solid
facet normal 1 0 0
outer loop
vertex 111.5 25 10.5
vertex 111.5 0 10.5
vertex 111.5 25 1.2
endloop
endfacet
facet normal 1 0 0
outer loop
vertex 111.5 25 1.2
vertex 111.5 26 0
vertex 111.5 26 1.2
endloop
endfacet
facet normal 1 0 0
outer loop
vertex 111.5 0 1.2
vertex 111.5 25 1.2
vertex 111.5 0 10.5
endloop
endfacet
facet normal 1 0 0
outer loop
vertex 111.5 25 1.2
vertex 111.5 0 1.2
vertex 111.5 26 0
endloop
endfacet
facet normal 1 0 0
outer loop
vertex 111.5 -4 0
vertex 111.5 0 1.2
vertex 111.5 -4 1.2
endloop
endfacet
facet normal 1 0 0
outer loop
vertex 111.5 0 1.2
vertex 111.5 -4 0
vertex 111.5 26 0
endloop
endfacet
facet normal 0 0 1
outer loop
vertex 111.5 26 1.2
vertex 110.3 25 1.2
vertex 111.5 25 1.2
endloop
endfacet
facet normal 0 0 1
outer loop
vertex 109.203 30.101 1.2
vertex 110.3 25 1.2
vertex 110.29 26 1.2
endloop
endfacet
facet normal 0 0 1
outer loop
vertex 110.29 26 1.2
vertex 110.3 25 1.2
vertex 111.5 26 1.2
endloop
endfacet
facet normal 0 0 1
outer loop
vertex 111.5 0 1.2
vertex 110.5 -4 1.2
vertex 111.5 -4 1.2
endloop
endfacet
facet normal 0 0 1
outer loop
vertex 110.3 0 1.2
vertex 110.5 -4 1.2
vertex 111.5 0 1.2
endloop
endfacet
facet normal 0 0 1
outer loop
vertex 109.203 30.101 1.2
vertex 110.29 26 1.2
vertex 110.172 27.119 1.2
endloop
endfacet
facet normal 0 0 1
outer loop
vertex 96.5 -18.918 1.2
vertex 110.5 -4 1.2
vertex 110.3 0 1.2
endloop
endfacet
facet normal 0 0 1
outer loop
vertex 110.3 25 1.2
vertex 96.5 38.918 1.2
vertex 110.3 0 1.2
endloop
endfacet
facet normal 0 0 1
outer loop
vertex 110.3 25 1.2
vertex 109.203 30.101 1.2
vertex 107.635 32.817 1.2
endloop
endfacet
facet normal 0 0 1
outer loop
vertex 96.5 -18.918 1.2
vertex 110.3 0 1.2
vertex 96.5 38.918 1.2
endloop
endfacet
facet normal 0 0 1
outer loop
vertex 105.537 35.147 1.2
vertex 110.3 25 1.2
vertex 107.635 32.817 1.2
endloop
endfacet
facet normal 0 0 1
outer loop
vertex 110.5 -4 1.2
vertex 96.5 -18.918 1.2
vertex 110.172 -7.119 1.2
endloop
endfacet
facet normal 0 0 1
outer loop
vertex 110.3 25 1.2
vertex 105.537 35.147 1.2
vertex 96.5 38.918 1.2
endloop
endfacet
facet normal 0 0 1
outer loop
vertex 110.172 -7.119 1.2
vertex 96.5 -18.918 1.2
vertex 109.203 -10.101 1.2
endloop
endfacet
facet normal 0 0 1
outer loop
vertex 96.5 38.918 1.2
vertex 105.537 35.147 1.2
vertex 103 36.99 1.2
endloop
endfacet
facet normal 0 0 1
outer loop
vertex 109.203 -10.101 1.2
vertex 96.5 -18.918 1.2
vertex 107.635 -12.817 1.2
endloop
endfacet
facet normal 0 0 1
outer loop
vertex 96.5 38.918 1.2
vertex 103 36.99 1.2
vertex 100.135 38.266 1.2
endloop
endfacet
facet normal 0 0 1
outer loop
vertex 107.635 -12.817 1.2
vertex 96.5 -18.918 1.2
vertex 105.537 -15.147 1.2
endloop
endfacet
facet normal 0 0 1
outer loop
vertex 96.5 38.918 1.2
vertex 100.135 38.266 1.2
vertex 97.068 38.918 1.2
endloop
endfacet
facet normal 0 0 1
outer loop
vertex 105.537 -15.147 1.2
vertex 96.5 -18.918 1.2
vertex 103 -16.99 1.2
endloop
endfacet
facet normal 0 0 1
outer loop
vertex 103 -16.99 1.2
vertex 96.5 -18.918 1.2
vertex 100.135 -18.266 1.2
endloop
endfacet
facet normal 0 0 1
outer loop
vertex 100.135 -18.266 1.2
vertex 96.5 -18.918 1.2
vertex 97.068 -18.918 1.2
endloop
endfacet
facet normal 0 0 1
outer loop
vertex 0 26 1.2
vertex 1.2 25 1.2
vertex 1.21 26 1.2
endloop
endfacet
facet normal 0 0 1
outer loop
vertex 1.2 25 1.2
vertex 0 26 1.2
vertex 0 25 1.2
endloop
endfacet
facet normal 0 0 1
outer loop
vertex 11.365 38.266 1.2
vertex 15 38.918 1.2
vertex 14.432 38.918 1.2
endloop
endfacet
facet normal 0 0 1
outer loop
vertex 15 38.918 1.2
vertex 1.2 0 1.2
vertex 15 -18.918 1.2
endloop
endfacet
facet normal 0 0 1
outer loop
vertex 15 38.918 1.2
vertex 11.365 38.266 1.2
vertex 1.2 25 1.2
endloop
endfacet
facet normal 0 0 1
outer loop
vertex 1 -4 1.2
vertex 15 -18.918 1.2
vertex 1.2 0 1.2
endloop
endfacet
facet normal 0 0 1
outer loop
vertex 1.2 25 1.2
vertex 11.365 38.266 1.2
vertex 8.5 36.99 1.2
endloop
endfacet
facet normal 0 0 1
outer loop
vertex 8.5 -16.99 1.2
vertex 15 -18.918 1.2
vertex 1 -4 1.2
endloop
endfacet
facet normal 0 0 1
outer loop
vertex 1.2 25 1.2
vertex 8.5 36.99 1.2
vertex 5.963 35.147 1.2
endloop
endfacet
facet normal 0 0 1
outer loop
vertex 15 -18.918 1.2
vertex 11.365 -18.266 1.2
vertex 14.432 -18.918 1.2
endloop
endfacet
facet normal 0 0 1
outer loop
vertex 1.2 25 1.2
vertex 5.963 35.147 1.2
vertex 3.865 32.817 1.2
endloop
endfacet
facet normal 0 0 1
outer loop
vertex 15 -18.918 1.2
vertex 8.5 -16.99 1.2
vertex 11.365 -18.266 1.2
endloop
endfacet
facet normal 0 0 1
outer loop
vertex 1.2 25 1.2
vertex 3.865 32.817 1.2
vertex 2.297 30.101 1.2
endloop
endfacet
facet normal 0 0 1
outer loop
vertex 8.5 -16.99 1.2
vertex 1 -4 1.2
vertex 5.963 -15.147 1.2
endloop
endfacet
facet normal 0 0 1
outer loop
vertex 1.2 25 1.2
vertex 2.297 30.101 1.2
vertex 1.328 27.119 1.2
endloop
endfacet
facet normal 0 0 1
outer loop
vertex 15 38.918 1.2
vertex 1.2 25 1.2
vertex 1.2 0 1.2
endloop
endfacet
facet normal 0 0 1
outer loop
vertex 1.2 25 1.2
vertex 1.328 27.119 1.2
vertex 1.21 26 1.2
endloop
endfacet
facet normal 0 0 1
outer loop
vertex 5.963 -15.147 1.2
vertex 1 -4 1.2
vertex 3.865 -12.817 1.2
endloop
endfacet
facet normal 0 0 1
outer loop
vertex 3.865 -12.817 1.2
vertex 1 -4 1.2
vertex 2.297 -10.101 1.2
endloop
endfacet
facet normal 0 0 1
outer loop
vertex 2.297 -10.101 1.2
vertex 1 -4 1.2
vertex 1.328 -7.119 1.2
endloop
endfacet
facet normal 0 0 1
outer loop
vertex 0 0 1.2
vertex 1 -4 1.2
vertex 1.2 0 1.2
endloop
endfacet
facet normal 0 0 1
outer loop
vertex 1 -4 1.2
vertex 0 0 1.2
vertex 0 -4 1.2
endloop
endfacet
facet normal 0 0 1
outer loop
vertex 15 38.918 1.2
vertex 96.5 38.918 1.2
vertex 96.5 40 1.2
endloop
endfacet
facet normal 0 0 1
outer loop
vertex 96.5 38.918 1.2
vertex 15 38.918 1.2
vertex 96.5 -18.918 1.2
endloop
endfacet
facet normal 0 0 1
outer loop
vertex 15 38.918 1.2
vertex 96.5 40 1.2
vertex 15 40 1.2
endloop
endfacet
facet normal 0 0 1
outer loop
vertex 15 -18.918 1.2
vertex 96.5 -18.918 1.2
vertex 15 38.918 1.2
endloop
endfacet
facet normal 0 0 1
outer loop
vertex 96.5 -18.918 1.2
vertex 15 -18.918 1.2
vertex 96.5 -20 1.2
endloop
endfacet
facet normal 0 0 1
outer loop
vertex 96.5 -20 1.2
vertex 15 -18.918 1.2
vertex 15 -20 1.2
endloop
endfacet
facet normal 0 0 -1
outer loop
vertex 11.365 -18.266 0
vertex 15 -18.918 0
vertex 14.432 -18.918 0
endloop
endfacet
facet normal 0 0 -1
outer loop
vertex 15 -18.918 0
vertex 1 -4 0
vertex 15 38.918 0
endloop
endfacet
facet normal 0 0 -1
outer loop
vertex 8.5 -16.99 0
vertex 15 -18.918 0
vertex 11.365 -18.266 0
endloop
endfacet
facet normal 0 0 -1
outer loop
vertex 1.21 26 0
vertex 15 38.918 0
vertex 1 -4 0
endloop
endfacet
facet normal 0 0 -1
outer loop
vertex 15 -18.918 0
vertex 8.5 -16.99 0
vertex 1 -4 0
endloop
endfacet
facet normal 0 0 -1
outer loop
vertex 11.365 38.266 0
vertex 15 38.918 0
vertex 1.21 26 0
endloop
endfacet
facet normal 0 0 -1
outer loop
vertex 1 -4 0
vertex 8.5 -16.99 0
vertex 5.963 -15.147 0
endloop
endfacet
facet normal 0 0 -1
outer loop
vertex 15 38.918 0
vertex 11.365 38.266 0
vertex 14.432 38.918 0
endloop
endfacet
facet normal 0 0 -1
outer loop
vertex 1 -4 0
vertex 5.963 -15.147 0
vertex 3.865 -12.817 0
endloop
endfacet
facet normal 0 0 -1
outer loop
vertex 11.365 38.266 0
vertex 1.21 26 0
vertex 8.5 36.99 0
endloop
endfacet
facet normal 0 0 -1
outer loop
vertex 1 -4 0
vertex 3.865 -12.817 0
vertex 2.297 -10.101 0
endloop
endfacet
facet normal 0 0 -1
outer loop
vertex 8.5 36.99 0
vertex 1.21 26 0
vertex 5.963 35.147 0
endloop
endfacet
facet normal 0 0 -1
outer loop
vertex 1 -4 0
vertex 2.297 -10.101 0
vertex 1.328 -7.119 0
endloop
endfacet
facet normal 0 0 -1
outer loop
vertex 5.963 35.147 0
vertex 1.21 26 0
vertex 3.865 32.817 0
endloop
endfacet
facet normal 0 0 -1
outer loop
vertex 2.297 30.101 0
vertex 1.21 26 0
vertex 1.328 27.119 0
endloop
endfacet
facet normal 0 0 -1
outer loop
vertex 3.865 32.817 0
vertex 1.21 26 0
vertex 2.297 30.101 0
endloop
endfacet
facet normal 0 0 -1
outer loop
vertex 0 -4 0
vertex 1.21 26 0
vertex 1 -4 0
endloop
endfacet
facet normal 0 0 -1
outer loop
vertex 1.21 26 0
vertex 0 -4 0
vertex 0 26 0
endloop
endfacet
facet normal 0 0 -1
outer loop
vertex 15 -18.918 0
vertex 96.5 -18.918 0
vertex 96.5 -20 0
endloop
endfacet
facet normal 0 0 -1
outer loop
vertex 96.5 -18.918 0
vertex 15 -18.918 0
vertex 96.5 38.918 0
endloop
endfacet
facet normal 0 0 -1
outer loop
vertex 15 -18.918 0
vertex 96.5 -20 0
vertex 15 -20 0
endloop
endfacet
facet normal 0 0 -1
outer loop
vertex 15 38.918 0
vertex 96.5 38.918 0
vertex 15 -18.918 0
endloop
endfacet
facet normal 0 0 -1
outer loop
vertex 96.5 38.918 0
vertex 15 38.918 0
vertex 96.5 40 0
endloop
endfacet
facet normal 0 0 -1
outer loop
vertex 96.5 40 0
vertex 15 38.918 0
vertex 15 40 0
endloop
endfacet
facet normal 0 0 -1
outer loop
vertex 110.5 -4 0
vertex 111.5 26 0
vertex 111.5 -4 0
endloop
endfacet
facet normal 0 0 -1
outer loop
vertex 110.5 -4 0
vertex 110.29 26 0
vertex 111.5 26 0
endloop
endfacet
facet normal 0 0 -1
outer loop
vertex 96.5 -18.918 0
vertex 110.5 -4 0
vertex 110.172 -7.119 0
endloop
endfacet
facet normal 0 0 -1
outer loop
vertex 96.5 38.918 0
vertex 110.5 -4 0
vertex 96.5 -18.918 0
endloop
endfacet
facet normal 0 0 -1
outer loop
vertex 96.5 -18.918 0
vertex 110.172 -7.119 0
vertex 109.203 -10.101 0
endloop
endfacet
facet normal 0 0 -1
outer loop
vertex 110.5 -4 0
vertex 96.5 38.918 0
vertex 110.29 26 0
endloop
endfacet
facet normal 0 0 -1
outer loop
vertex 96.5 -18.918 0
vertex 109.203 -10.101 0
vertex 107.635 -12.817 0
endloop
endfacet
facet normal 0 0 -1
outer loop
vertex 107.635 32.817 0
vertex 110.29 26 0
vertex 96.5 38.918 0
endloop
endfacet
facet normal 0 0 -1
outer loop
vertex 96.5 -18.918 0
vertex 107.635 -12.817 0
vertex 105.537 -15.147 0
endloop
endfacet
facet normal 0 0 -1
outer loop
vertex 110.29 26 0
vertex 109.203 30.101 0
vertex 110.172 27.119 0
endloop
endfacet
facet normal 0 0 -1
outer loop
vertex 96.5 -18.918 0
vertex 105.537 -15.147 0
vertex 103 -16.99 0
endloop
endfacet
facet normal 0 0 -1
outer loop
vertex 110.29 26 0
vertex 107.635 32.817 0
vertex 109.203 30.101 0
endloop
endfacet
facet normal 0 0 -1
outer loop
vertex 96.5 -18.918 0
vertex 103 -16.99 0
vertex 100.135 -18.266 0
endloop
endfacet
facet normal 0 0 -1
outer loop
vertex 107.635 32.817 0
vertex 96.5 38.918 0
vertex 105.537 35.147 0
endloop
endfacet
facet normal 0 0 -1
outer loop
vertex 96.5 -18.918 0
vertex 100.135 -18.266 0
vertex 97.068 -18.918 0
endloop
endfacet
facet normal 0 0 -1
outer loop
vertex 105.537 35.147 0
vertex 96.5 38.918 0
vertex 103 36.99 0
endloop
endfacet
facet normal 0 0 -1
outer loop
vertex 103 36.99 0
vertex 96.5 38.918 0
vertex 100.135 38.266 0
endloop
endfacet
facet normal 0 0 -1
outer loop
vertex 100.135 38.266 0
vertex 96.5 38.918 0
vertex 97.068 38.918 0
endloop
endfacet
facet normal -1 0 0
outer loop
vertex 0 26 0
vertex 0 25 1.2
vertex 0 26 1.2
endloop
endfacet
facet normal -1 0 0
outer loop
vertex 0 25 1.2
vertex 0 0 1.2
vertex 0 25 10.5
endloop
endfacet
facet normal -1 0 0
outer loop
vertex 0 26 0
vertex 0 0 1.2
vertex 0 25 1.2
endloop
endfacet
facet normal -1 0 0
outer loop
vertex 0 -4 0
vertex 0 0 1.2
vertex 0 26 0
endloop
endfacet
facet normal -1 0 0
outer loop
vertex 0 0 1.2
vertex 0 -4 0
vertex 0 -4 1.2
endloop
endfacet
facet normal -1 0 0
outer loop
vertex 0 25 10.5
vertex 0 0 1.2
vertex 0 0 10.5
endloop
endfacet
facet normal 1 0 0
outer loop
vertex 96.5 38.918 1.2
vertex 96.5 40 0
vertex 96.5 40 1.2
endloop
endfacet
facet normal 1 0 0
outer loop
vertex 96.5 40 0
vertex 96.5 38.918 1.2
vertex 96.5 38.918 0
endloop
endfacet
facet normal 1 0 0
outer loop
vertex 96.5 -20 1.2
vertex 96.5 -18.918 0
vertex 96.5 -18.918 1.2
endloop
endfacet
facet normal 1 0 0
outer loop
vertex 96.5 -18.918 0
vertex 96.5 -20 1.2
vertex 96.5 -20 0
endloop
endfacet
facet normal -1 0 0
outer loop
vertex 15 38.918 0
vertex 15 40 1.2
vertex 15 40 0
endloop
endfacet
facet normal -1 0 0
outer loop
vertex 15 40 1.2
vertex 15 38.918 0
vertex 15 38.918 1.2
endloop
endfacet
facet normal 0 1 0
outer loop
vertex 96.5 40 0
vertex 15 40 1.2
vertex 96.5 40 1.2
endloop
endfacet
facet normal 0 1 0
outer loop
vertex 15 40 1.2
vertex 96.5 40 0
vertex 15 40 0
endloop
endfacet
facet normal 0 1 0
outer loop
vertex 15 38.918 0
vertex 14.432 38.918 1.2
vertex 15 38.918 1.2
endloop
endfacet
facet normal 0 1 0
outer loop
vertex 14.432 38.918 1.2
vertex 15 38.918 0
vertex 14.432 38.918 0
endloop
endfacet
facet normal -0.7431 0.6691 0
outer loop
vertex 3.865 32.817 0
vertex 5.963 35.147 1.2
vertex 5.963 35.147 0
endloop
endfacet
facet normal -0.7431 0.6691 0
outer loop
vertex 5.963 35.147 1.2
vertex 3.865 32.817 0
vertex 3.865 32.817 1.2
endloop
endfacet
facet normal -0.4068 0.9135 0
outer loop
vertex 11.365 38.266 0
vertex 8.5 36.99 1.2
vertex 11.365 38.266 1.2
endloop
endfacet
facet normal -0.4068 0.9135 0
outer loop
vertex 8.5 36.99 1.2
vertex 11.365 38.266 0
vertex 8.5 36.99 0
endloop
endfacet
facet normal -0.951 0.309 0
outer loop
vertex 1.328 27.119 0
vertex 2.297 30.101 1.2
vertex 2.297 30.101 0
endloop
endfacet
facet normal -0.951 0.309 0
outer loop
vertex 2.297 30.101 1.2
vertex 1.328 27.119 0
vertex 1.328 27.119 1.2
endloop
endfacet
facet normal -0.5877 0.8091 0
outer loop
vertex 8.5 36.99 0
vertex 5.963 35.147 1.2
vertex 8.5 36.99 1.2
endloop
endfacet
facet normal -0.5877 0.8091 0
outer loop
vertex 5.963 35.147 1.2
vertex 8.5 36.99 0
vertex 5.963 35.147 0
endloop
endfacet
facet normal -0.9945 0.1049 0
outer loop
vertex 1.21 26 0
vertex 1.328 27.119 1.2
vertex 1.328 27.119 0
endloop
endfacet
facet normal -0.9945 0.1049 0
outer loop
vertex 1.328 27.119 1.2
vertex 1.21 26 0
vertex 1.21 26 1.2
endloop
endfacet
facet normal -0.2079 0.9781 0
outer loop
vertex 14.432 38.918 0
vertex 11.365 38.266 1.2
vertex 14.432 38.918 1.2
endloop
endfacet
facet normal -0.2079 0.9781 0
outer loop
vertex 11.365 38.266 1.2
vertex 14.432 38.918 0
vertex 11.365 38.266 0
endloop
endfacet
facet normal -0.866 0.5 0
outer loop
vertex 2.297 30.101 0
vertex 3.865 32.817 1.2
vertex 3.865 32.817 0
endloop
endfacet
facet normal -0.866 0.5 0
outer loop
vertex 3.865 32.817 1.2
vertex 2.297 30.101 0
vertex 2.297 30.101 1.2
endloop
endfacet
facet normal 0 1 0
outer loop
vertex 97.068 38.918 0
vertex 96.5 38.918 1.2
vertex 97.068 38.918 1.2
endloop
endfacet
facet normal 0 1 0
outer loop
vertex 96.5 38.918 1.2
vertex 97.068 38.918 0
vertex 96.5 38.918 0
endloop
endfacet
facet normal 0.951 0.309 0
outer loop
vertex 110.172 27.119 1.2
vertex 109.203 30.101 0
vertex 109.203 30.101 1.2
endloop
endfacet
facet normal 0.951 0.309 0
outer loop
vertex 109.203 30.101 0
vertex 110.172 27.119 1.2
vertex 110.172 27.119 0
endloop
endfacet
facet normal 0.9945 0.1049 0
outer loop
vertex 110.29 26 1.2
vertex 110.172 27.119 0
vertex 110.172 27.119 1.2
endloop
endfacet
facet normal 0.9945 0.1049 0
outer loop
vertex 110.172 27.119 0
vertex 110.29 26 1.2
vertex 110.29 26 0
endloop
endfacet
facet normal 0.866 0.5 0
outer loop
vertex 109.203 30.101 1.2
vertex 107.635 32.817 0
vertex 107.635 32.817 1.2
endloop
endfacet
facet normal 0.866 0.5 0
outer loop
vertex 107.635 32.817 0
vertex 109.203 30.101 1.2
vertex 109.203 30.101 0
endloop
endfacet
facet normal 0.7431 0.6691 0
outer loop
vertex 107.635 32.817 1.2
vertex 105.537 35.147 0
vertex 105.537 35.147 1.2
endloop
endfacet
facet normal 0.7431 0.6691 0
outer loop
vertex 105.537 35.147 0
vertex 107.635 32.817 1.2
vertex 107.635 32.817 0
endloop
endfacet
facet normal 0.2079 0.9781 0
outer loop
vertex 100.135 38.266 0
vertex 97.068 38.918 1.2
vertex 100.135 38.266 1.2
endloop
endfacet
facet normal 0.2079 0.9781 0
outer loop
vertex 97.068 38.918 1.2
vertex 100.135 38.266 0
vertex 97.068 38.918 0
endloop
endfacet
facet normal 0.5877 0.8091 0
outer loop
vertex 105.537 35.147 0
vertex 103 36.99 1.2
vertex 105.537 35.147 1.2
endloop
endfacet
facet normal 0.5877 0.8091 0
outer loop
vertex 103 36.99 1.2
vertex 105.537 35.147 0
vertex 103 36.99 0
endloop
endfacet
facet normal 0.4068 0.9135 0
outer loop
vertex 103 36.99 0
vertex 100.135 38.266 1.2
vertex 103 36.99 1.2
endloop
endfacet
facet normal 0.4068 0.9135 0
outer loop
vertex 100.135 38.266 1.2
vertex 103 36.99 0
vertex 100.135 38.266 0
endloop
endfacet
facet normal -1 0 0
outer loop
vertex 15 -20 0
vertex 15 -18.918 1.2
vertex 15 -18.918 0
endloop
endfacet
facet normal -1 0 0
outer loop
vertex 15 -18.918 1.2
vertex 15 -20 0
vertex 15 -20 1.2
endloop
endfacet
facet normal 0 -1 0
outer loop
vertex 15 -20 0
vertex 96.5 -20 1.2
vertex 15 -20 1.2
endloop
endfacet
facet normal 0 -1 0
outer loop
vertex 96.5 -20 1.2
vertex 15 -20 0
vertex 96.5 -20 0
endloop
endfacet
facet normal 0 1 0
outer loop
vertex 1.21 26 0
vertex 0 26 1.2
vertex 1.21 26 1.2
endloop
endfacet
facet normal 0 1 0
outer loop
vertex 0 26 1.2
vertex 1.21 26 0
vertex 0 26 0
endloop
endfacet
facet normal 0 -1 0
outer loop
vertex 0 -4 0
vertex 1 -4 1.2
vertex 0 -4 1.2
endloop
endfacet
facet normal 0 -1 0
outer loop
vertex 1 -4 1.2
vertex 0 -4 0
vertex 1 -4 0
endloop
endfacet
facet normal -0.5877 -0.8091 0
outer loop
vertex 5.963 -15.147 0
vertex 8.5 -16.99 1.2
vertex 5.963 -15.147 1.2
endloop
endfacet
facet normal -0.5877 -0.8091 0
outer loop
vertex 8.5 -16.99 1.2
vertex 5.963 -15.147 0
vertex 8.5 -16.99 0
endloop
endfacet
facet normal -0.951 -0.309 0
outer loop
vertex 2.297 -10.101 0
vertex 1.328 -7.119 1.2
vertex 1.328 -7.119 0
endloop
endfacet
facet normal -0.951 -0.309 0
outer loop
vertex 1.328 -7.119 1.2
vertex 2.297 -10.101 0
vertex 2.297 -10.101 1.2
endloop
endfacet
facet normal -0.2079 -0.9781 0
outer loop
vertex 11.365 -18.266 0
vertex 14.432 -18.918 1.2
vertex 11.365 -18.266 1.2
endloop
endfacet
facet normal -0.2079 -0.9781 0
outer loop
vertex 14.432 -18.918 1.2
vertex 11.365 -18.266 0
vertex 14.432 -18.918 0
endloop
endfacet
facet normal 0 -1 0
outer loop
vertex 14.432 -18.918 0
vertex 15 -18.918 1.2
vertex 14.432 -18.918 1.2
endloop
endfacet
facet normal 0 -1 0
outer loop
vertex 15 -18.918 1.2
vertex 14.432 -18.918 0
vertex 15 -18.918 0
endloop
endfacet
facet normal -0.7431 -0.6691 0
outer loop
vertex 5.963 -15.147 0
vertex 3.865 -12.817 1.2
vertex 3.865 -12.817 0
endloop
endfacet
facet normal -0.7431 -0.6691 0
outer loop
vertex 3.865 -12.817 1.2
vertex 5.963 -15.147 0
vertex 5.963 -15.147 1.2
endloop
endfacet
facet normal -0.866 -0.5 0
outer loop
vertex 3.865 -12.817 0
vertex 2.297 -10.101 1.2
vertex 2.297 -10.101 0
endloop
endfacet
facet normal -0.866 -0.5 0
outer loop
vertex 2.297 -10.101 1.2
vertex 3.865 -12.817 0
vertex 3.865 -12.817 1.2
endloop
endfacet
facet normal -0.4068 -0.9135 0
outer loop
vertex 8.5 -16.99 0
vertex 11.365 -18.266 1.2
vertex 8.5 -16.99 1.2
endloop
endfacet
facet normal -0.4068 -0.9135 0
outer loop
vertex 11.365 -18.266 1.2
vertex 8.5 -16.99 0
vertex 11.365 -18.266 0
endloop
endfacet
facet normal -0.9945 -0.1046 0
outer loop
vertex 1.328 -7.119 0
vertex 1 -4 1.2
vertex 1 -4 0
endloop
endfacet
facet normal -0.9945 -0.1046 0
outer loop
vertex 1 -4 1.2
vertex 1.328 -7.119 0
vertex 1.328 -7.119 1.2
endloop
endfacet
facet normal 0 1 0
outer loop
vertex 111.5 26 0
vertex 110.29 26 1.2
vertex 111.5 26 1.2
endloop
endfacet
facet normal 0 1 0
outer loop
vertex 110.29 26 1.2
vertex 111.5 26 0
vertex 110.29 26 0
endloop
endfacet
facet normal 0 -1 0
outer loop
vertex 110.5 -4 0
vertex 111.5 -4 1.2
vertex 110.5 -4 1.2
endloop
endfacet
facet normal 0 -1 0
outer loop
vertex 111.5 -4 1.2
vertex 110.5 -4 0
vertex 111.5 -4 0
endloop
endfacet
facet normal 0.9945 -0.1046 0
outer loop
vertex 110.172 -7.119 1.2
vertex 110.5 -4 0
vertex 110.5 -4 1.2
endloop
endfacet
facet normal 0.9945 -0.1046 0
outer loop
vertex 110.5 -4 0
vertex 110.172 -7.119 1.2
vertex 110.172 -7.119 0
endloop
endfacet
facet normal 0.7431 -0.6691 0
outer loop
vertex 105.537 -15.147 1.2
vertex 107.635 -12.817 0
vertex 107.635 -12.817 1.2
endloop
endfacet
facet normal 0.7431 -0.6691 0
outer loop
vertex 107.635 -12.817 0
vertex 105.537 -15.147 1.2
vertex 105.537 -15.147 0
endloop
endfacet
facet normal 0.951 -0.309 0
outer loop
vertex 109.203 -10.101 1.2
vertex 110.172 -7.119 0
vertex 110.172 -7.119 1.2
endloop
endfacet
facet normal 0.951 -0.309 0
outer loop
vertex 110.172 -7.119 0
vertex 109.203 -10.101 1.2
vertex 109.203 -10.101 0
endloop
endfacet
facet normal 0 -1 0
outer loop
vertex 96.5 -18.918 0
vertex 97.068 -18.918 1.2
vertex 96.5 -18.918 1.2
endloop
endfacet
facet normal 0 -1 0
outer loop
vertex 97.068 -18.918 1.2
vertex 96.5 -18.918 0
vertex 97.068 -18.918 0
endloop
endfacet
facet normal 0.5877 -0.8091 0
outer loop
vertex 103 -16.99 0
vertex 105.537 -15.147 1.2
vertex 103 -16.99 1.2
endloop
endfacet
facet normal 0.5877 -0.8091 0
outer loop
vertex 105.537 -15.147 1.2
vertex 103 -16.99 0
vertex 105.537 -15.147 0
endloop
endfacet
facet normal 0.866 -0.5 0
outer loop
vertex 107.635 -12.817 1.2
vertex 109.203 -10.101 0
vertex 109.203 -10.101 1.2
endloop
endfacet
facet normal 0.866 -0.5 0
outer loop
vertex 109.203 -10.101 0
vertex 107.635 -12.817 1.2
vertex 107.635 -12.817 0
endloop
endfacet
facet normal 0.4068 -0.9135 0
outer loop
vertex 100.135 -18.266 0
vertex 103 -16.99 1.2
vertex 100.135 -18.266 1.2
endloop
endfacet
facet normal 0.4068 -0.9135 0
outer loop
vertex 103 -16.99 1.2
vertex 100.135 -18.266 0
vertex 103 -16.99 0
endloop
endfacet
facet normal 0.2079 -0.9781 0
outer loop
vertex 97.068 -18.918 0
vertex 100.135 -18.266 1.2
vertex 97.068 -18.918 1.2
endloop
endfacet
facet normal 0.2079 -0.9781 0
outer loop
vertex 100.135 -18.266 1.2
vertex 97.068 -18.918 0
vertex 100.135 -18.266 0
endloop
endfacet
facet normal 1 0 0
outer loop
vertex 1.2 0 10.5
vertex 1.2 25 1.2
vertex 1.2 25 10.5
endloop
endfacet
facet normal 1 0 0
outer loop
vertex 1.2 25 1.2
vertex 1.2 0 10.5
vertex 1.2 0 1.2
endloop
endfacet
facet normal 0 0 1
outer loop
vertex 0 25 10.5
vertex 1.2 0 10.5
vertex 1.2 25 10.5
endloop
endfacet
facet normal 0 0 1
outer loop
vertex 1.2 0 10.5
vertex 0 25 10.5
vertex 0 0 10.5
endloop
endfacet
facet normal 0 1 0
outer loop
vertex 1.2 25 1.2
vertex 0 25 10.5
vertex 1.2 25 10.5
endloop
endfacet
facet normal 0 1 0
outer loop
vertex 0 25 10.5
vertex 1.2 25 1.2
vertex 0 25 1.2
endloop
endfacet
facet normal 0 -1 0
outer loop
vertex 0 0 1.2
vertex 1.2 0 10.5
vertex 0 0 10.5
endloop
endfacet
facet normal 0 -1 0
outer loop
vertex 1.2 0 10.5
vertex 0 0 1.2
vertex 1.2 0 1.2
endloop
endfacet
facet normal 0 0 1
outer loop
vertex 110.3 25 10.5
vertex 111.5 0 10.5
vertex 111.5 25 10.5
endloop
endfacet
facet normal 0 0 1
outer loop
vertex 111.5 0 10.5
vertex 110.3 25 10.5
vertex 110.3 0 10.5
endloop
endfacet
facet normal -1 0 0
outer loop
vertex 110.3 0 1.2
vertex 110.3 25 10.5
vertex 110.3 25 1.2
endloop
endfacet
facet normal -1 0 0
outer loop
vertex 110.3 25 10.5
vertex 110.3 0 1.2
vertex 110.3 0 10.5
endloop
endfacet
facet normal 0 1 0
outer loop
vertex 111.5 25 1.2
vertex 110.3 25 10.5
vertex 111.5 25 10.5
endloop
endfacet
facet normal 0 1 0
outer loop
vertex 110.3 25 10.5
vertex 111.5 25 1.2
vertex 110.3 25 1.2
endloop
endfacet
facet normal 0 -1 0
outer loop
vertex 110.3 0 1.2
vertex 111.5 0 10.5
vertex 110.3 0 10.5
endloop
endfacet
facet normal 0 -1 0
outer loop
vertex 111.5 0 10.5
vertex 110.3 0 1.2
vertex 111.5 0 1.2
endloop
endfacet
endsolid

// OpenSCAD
breite = 111.5;
hoehe1 = 25;
hoehe2 = 15;
hoehe3 = 20;
wandstaerke = 1.2;

// Trennwand unten
cube([breite, hoehe1, wandstaerke]);

translate([15, hoehe1, 0])
cube([breite-2*15, hoehe2, wandstaerke]);

// Rundungen unten
translate([15+1, hoehe1-1, 0])
cylinder(r=15, h=wandstaerke);

translate([breite-15-1, hoehe1-1, 0])
cylinder(r=15, h=wandstaerke);


// Trennwand oben
translate([15, -hoehe3, 0])
cube([breite-2*15, hoehe3, wandstaerke]);

// Rundungen oben
translate([0, -hoehe3+15+1, 0])
cube([2*15, 2*15, wandstaerke]);
translate([15+1, -hoehe3+15+1, 0])
cylinder(r=15, h=wandstaerke);

translate([breite-15, -hoehe3+15+1, 0])
cube([15, 2*15, wandstaerke]);
translate([breite-15-1, -hoehe3+15+1, 0])
cylinder(r=15, h=wandstaerke);


// Halterungen
cube([wandstaerke, hoehe1, 10.5]);
translate([breite-wandstaerke, 0, 0])
cube([wandstaerke, hoehe1, 10.5]);
